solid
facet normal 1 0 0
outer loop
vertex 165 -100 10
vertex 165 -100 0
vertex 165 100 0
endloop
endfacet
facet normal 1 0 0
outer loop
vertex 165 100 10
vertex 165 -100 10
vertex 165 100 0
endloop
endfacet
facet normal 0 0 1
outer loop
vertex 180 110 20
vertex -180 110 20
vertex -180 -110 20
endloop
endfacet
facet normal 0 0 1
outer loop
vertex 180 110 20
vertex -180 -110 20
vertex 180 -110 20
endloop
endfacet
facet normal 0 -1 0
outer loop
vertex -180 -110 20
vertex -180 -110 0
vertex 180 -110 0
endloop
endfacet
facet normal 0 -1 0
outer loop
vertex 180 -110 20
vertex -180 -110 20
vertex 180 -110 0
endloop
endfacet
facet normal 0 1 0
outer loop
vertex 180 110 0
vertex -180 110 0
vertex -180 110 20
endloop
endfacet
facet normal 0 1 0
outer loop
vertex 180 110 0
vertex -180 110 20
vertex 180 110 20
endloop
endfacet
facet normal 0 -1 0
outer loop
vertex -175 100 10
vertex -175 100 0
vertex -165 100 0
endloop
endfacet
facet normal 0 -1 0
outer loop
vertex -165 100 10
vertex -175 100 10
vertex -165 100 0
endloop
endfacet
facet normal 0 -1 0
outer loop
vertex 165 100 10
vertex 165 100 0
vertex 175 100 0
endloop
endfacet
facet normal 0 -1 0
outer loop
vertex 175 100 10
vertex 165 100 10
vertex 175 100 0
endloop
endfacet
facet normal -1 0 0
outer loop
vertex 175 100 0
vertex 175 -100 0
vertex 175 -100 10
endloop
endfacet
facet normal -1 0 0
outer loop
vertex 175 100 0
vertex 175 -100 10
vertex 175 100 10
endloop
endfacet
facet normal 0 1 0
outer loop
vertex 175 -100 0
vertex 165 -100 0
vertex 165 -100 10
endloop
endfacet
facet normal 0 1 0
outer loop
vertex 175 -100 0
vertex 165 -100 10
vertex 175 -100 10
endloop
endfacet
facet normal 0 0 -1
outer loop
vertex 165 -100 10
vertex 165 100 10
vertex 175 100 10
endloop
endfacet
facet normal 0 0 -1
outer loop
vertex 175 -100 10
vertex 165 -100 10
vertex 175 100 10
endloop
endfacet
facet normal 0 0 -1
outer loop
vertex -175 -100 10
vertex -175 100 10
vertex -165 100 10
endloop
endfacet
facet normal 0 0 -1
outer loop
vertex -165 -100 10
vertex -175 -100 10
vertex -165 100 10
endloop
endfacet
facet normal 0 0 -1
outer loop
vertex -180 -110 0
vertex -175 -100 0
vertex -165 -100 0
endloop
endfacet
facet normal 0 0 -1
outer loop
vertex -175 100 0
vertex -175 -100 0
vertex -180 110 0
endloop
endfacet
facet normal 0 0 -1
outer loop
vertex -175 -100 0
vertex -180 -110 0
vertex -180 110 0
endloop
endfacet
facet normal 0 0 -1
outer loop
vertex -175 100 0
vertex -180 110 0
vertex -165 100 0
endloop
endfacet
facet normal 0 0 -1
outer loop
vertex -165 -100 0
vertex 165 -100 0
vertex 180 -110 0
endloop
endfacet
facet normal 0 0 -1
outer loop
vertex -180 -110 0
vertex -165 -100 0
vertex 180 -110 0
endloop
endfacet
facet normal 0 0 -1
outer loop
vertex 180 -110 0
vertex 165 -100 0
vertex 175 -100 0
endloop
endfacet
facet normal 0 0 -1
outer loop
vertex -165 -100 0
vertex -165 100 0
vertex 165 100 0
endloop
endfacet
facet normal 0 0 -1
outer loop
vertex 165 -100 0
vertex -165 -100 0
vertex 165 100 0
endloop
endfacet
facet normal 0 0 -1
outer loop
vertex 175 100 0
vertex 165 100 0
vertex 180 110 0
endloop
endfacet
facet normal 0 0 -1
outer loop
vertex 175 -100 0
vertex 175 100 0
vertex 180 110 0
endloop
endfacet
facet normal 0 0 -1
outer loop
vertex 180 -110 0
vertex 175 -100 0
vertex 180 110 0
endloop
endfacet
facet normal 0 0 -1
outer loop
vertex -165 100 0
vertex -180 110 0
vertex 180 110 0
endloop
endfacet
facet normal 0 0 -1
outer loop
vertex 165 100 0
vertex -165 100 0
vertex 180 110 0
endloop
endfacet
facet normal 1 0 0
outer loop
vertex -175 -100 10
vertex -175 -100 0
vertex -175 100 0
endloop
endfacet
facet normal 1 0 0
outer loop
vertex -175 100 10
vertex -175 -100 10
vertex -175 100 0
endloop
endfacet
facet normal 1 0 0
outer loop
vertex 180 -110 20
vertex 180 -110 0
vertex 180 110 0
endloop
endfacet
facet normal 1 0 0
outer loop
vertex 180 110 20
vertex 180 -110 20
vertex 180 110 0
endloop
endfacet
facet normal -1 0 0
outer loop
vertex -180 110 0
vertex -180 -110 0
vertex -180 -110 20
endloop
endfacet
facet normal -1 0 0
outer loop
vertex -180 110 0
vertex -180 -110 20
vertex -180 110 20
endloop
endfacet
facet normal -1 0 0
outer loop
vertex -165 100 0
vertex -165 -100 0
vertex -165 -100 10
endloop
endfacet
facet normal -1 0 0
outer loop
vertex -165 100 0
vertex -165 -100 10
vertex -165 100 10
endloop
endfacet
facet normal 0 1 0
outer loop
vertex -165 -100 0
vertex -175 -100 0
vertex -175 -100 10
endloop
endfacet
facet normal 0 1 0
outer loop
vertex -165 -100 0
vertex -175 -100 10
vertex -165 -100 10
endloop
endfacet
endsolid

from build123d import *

# Parameters (mm, degrees)
F0_W     = 360
F0_H     = 220
F1_DEPTH = 20
F2_W     = 10
F2_H     = 200
F3_DEPTH = 10
F4_W     = 10
F4_H     = 200
F5_DEPTH = 10


with BuildPart() as f1:
    # F0 (on Top) → F1 (new body)
    with BuildSketch(Plane.XY):
        Rectangle(F0_W, F0_H)
    extrude(amount=F1_DEPTH)

    # F2 (on Top) → F3 (cut)
    with BuildSketch(Plane.XY):
        with Locations((-170, 0)):
            Rectangle(F2_W, F2_H)
    extrude(amount=F3_DEPTH, mode=Mode.SUBTRACT)

    # F4 (on Top) → F5 (cut)
    with BuildSketch(Plane.XY):
        with Locations((170, 0)):
            Rectangle(F4_W, F4_H)
    extrude(amount=F5_DEPTH, mode=Mode.SUBTRACT)


solid = f1.part
